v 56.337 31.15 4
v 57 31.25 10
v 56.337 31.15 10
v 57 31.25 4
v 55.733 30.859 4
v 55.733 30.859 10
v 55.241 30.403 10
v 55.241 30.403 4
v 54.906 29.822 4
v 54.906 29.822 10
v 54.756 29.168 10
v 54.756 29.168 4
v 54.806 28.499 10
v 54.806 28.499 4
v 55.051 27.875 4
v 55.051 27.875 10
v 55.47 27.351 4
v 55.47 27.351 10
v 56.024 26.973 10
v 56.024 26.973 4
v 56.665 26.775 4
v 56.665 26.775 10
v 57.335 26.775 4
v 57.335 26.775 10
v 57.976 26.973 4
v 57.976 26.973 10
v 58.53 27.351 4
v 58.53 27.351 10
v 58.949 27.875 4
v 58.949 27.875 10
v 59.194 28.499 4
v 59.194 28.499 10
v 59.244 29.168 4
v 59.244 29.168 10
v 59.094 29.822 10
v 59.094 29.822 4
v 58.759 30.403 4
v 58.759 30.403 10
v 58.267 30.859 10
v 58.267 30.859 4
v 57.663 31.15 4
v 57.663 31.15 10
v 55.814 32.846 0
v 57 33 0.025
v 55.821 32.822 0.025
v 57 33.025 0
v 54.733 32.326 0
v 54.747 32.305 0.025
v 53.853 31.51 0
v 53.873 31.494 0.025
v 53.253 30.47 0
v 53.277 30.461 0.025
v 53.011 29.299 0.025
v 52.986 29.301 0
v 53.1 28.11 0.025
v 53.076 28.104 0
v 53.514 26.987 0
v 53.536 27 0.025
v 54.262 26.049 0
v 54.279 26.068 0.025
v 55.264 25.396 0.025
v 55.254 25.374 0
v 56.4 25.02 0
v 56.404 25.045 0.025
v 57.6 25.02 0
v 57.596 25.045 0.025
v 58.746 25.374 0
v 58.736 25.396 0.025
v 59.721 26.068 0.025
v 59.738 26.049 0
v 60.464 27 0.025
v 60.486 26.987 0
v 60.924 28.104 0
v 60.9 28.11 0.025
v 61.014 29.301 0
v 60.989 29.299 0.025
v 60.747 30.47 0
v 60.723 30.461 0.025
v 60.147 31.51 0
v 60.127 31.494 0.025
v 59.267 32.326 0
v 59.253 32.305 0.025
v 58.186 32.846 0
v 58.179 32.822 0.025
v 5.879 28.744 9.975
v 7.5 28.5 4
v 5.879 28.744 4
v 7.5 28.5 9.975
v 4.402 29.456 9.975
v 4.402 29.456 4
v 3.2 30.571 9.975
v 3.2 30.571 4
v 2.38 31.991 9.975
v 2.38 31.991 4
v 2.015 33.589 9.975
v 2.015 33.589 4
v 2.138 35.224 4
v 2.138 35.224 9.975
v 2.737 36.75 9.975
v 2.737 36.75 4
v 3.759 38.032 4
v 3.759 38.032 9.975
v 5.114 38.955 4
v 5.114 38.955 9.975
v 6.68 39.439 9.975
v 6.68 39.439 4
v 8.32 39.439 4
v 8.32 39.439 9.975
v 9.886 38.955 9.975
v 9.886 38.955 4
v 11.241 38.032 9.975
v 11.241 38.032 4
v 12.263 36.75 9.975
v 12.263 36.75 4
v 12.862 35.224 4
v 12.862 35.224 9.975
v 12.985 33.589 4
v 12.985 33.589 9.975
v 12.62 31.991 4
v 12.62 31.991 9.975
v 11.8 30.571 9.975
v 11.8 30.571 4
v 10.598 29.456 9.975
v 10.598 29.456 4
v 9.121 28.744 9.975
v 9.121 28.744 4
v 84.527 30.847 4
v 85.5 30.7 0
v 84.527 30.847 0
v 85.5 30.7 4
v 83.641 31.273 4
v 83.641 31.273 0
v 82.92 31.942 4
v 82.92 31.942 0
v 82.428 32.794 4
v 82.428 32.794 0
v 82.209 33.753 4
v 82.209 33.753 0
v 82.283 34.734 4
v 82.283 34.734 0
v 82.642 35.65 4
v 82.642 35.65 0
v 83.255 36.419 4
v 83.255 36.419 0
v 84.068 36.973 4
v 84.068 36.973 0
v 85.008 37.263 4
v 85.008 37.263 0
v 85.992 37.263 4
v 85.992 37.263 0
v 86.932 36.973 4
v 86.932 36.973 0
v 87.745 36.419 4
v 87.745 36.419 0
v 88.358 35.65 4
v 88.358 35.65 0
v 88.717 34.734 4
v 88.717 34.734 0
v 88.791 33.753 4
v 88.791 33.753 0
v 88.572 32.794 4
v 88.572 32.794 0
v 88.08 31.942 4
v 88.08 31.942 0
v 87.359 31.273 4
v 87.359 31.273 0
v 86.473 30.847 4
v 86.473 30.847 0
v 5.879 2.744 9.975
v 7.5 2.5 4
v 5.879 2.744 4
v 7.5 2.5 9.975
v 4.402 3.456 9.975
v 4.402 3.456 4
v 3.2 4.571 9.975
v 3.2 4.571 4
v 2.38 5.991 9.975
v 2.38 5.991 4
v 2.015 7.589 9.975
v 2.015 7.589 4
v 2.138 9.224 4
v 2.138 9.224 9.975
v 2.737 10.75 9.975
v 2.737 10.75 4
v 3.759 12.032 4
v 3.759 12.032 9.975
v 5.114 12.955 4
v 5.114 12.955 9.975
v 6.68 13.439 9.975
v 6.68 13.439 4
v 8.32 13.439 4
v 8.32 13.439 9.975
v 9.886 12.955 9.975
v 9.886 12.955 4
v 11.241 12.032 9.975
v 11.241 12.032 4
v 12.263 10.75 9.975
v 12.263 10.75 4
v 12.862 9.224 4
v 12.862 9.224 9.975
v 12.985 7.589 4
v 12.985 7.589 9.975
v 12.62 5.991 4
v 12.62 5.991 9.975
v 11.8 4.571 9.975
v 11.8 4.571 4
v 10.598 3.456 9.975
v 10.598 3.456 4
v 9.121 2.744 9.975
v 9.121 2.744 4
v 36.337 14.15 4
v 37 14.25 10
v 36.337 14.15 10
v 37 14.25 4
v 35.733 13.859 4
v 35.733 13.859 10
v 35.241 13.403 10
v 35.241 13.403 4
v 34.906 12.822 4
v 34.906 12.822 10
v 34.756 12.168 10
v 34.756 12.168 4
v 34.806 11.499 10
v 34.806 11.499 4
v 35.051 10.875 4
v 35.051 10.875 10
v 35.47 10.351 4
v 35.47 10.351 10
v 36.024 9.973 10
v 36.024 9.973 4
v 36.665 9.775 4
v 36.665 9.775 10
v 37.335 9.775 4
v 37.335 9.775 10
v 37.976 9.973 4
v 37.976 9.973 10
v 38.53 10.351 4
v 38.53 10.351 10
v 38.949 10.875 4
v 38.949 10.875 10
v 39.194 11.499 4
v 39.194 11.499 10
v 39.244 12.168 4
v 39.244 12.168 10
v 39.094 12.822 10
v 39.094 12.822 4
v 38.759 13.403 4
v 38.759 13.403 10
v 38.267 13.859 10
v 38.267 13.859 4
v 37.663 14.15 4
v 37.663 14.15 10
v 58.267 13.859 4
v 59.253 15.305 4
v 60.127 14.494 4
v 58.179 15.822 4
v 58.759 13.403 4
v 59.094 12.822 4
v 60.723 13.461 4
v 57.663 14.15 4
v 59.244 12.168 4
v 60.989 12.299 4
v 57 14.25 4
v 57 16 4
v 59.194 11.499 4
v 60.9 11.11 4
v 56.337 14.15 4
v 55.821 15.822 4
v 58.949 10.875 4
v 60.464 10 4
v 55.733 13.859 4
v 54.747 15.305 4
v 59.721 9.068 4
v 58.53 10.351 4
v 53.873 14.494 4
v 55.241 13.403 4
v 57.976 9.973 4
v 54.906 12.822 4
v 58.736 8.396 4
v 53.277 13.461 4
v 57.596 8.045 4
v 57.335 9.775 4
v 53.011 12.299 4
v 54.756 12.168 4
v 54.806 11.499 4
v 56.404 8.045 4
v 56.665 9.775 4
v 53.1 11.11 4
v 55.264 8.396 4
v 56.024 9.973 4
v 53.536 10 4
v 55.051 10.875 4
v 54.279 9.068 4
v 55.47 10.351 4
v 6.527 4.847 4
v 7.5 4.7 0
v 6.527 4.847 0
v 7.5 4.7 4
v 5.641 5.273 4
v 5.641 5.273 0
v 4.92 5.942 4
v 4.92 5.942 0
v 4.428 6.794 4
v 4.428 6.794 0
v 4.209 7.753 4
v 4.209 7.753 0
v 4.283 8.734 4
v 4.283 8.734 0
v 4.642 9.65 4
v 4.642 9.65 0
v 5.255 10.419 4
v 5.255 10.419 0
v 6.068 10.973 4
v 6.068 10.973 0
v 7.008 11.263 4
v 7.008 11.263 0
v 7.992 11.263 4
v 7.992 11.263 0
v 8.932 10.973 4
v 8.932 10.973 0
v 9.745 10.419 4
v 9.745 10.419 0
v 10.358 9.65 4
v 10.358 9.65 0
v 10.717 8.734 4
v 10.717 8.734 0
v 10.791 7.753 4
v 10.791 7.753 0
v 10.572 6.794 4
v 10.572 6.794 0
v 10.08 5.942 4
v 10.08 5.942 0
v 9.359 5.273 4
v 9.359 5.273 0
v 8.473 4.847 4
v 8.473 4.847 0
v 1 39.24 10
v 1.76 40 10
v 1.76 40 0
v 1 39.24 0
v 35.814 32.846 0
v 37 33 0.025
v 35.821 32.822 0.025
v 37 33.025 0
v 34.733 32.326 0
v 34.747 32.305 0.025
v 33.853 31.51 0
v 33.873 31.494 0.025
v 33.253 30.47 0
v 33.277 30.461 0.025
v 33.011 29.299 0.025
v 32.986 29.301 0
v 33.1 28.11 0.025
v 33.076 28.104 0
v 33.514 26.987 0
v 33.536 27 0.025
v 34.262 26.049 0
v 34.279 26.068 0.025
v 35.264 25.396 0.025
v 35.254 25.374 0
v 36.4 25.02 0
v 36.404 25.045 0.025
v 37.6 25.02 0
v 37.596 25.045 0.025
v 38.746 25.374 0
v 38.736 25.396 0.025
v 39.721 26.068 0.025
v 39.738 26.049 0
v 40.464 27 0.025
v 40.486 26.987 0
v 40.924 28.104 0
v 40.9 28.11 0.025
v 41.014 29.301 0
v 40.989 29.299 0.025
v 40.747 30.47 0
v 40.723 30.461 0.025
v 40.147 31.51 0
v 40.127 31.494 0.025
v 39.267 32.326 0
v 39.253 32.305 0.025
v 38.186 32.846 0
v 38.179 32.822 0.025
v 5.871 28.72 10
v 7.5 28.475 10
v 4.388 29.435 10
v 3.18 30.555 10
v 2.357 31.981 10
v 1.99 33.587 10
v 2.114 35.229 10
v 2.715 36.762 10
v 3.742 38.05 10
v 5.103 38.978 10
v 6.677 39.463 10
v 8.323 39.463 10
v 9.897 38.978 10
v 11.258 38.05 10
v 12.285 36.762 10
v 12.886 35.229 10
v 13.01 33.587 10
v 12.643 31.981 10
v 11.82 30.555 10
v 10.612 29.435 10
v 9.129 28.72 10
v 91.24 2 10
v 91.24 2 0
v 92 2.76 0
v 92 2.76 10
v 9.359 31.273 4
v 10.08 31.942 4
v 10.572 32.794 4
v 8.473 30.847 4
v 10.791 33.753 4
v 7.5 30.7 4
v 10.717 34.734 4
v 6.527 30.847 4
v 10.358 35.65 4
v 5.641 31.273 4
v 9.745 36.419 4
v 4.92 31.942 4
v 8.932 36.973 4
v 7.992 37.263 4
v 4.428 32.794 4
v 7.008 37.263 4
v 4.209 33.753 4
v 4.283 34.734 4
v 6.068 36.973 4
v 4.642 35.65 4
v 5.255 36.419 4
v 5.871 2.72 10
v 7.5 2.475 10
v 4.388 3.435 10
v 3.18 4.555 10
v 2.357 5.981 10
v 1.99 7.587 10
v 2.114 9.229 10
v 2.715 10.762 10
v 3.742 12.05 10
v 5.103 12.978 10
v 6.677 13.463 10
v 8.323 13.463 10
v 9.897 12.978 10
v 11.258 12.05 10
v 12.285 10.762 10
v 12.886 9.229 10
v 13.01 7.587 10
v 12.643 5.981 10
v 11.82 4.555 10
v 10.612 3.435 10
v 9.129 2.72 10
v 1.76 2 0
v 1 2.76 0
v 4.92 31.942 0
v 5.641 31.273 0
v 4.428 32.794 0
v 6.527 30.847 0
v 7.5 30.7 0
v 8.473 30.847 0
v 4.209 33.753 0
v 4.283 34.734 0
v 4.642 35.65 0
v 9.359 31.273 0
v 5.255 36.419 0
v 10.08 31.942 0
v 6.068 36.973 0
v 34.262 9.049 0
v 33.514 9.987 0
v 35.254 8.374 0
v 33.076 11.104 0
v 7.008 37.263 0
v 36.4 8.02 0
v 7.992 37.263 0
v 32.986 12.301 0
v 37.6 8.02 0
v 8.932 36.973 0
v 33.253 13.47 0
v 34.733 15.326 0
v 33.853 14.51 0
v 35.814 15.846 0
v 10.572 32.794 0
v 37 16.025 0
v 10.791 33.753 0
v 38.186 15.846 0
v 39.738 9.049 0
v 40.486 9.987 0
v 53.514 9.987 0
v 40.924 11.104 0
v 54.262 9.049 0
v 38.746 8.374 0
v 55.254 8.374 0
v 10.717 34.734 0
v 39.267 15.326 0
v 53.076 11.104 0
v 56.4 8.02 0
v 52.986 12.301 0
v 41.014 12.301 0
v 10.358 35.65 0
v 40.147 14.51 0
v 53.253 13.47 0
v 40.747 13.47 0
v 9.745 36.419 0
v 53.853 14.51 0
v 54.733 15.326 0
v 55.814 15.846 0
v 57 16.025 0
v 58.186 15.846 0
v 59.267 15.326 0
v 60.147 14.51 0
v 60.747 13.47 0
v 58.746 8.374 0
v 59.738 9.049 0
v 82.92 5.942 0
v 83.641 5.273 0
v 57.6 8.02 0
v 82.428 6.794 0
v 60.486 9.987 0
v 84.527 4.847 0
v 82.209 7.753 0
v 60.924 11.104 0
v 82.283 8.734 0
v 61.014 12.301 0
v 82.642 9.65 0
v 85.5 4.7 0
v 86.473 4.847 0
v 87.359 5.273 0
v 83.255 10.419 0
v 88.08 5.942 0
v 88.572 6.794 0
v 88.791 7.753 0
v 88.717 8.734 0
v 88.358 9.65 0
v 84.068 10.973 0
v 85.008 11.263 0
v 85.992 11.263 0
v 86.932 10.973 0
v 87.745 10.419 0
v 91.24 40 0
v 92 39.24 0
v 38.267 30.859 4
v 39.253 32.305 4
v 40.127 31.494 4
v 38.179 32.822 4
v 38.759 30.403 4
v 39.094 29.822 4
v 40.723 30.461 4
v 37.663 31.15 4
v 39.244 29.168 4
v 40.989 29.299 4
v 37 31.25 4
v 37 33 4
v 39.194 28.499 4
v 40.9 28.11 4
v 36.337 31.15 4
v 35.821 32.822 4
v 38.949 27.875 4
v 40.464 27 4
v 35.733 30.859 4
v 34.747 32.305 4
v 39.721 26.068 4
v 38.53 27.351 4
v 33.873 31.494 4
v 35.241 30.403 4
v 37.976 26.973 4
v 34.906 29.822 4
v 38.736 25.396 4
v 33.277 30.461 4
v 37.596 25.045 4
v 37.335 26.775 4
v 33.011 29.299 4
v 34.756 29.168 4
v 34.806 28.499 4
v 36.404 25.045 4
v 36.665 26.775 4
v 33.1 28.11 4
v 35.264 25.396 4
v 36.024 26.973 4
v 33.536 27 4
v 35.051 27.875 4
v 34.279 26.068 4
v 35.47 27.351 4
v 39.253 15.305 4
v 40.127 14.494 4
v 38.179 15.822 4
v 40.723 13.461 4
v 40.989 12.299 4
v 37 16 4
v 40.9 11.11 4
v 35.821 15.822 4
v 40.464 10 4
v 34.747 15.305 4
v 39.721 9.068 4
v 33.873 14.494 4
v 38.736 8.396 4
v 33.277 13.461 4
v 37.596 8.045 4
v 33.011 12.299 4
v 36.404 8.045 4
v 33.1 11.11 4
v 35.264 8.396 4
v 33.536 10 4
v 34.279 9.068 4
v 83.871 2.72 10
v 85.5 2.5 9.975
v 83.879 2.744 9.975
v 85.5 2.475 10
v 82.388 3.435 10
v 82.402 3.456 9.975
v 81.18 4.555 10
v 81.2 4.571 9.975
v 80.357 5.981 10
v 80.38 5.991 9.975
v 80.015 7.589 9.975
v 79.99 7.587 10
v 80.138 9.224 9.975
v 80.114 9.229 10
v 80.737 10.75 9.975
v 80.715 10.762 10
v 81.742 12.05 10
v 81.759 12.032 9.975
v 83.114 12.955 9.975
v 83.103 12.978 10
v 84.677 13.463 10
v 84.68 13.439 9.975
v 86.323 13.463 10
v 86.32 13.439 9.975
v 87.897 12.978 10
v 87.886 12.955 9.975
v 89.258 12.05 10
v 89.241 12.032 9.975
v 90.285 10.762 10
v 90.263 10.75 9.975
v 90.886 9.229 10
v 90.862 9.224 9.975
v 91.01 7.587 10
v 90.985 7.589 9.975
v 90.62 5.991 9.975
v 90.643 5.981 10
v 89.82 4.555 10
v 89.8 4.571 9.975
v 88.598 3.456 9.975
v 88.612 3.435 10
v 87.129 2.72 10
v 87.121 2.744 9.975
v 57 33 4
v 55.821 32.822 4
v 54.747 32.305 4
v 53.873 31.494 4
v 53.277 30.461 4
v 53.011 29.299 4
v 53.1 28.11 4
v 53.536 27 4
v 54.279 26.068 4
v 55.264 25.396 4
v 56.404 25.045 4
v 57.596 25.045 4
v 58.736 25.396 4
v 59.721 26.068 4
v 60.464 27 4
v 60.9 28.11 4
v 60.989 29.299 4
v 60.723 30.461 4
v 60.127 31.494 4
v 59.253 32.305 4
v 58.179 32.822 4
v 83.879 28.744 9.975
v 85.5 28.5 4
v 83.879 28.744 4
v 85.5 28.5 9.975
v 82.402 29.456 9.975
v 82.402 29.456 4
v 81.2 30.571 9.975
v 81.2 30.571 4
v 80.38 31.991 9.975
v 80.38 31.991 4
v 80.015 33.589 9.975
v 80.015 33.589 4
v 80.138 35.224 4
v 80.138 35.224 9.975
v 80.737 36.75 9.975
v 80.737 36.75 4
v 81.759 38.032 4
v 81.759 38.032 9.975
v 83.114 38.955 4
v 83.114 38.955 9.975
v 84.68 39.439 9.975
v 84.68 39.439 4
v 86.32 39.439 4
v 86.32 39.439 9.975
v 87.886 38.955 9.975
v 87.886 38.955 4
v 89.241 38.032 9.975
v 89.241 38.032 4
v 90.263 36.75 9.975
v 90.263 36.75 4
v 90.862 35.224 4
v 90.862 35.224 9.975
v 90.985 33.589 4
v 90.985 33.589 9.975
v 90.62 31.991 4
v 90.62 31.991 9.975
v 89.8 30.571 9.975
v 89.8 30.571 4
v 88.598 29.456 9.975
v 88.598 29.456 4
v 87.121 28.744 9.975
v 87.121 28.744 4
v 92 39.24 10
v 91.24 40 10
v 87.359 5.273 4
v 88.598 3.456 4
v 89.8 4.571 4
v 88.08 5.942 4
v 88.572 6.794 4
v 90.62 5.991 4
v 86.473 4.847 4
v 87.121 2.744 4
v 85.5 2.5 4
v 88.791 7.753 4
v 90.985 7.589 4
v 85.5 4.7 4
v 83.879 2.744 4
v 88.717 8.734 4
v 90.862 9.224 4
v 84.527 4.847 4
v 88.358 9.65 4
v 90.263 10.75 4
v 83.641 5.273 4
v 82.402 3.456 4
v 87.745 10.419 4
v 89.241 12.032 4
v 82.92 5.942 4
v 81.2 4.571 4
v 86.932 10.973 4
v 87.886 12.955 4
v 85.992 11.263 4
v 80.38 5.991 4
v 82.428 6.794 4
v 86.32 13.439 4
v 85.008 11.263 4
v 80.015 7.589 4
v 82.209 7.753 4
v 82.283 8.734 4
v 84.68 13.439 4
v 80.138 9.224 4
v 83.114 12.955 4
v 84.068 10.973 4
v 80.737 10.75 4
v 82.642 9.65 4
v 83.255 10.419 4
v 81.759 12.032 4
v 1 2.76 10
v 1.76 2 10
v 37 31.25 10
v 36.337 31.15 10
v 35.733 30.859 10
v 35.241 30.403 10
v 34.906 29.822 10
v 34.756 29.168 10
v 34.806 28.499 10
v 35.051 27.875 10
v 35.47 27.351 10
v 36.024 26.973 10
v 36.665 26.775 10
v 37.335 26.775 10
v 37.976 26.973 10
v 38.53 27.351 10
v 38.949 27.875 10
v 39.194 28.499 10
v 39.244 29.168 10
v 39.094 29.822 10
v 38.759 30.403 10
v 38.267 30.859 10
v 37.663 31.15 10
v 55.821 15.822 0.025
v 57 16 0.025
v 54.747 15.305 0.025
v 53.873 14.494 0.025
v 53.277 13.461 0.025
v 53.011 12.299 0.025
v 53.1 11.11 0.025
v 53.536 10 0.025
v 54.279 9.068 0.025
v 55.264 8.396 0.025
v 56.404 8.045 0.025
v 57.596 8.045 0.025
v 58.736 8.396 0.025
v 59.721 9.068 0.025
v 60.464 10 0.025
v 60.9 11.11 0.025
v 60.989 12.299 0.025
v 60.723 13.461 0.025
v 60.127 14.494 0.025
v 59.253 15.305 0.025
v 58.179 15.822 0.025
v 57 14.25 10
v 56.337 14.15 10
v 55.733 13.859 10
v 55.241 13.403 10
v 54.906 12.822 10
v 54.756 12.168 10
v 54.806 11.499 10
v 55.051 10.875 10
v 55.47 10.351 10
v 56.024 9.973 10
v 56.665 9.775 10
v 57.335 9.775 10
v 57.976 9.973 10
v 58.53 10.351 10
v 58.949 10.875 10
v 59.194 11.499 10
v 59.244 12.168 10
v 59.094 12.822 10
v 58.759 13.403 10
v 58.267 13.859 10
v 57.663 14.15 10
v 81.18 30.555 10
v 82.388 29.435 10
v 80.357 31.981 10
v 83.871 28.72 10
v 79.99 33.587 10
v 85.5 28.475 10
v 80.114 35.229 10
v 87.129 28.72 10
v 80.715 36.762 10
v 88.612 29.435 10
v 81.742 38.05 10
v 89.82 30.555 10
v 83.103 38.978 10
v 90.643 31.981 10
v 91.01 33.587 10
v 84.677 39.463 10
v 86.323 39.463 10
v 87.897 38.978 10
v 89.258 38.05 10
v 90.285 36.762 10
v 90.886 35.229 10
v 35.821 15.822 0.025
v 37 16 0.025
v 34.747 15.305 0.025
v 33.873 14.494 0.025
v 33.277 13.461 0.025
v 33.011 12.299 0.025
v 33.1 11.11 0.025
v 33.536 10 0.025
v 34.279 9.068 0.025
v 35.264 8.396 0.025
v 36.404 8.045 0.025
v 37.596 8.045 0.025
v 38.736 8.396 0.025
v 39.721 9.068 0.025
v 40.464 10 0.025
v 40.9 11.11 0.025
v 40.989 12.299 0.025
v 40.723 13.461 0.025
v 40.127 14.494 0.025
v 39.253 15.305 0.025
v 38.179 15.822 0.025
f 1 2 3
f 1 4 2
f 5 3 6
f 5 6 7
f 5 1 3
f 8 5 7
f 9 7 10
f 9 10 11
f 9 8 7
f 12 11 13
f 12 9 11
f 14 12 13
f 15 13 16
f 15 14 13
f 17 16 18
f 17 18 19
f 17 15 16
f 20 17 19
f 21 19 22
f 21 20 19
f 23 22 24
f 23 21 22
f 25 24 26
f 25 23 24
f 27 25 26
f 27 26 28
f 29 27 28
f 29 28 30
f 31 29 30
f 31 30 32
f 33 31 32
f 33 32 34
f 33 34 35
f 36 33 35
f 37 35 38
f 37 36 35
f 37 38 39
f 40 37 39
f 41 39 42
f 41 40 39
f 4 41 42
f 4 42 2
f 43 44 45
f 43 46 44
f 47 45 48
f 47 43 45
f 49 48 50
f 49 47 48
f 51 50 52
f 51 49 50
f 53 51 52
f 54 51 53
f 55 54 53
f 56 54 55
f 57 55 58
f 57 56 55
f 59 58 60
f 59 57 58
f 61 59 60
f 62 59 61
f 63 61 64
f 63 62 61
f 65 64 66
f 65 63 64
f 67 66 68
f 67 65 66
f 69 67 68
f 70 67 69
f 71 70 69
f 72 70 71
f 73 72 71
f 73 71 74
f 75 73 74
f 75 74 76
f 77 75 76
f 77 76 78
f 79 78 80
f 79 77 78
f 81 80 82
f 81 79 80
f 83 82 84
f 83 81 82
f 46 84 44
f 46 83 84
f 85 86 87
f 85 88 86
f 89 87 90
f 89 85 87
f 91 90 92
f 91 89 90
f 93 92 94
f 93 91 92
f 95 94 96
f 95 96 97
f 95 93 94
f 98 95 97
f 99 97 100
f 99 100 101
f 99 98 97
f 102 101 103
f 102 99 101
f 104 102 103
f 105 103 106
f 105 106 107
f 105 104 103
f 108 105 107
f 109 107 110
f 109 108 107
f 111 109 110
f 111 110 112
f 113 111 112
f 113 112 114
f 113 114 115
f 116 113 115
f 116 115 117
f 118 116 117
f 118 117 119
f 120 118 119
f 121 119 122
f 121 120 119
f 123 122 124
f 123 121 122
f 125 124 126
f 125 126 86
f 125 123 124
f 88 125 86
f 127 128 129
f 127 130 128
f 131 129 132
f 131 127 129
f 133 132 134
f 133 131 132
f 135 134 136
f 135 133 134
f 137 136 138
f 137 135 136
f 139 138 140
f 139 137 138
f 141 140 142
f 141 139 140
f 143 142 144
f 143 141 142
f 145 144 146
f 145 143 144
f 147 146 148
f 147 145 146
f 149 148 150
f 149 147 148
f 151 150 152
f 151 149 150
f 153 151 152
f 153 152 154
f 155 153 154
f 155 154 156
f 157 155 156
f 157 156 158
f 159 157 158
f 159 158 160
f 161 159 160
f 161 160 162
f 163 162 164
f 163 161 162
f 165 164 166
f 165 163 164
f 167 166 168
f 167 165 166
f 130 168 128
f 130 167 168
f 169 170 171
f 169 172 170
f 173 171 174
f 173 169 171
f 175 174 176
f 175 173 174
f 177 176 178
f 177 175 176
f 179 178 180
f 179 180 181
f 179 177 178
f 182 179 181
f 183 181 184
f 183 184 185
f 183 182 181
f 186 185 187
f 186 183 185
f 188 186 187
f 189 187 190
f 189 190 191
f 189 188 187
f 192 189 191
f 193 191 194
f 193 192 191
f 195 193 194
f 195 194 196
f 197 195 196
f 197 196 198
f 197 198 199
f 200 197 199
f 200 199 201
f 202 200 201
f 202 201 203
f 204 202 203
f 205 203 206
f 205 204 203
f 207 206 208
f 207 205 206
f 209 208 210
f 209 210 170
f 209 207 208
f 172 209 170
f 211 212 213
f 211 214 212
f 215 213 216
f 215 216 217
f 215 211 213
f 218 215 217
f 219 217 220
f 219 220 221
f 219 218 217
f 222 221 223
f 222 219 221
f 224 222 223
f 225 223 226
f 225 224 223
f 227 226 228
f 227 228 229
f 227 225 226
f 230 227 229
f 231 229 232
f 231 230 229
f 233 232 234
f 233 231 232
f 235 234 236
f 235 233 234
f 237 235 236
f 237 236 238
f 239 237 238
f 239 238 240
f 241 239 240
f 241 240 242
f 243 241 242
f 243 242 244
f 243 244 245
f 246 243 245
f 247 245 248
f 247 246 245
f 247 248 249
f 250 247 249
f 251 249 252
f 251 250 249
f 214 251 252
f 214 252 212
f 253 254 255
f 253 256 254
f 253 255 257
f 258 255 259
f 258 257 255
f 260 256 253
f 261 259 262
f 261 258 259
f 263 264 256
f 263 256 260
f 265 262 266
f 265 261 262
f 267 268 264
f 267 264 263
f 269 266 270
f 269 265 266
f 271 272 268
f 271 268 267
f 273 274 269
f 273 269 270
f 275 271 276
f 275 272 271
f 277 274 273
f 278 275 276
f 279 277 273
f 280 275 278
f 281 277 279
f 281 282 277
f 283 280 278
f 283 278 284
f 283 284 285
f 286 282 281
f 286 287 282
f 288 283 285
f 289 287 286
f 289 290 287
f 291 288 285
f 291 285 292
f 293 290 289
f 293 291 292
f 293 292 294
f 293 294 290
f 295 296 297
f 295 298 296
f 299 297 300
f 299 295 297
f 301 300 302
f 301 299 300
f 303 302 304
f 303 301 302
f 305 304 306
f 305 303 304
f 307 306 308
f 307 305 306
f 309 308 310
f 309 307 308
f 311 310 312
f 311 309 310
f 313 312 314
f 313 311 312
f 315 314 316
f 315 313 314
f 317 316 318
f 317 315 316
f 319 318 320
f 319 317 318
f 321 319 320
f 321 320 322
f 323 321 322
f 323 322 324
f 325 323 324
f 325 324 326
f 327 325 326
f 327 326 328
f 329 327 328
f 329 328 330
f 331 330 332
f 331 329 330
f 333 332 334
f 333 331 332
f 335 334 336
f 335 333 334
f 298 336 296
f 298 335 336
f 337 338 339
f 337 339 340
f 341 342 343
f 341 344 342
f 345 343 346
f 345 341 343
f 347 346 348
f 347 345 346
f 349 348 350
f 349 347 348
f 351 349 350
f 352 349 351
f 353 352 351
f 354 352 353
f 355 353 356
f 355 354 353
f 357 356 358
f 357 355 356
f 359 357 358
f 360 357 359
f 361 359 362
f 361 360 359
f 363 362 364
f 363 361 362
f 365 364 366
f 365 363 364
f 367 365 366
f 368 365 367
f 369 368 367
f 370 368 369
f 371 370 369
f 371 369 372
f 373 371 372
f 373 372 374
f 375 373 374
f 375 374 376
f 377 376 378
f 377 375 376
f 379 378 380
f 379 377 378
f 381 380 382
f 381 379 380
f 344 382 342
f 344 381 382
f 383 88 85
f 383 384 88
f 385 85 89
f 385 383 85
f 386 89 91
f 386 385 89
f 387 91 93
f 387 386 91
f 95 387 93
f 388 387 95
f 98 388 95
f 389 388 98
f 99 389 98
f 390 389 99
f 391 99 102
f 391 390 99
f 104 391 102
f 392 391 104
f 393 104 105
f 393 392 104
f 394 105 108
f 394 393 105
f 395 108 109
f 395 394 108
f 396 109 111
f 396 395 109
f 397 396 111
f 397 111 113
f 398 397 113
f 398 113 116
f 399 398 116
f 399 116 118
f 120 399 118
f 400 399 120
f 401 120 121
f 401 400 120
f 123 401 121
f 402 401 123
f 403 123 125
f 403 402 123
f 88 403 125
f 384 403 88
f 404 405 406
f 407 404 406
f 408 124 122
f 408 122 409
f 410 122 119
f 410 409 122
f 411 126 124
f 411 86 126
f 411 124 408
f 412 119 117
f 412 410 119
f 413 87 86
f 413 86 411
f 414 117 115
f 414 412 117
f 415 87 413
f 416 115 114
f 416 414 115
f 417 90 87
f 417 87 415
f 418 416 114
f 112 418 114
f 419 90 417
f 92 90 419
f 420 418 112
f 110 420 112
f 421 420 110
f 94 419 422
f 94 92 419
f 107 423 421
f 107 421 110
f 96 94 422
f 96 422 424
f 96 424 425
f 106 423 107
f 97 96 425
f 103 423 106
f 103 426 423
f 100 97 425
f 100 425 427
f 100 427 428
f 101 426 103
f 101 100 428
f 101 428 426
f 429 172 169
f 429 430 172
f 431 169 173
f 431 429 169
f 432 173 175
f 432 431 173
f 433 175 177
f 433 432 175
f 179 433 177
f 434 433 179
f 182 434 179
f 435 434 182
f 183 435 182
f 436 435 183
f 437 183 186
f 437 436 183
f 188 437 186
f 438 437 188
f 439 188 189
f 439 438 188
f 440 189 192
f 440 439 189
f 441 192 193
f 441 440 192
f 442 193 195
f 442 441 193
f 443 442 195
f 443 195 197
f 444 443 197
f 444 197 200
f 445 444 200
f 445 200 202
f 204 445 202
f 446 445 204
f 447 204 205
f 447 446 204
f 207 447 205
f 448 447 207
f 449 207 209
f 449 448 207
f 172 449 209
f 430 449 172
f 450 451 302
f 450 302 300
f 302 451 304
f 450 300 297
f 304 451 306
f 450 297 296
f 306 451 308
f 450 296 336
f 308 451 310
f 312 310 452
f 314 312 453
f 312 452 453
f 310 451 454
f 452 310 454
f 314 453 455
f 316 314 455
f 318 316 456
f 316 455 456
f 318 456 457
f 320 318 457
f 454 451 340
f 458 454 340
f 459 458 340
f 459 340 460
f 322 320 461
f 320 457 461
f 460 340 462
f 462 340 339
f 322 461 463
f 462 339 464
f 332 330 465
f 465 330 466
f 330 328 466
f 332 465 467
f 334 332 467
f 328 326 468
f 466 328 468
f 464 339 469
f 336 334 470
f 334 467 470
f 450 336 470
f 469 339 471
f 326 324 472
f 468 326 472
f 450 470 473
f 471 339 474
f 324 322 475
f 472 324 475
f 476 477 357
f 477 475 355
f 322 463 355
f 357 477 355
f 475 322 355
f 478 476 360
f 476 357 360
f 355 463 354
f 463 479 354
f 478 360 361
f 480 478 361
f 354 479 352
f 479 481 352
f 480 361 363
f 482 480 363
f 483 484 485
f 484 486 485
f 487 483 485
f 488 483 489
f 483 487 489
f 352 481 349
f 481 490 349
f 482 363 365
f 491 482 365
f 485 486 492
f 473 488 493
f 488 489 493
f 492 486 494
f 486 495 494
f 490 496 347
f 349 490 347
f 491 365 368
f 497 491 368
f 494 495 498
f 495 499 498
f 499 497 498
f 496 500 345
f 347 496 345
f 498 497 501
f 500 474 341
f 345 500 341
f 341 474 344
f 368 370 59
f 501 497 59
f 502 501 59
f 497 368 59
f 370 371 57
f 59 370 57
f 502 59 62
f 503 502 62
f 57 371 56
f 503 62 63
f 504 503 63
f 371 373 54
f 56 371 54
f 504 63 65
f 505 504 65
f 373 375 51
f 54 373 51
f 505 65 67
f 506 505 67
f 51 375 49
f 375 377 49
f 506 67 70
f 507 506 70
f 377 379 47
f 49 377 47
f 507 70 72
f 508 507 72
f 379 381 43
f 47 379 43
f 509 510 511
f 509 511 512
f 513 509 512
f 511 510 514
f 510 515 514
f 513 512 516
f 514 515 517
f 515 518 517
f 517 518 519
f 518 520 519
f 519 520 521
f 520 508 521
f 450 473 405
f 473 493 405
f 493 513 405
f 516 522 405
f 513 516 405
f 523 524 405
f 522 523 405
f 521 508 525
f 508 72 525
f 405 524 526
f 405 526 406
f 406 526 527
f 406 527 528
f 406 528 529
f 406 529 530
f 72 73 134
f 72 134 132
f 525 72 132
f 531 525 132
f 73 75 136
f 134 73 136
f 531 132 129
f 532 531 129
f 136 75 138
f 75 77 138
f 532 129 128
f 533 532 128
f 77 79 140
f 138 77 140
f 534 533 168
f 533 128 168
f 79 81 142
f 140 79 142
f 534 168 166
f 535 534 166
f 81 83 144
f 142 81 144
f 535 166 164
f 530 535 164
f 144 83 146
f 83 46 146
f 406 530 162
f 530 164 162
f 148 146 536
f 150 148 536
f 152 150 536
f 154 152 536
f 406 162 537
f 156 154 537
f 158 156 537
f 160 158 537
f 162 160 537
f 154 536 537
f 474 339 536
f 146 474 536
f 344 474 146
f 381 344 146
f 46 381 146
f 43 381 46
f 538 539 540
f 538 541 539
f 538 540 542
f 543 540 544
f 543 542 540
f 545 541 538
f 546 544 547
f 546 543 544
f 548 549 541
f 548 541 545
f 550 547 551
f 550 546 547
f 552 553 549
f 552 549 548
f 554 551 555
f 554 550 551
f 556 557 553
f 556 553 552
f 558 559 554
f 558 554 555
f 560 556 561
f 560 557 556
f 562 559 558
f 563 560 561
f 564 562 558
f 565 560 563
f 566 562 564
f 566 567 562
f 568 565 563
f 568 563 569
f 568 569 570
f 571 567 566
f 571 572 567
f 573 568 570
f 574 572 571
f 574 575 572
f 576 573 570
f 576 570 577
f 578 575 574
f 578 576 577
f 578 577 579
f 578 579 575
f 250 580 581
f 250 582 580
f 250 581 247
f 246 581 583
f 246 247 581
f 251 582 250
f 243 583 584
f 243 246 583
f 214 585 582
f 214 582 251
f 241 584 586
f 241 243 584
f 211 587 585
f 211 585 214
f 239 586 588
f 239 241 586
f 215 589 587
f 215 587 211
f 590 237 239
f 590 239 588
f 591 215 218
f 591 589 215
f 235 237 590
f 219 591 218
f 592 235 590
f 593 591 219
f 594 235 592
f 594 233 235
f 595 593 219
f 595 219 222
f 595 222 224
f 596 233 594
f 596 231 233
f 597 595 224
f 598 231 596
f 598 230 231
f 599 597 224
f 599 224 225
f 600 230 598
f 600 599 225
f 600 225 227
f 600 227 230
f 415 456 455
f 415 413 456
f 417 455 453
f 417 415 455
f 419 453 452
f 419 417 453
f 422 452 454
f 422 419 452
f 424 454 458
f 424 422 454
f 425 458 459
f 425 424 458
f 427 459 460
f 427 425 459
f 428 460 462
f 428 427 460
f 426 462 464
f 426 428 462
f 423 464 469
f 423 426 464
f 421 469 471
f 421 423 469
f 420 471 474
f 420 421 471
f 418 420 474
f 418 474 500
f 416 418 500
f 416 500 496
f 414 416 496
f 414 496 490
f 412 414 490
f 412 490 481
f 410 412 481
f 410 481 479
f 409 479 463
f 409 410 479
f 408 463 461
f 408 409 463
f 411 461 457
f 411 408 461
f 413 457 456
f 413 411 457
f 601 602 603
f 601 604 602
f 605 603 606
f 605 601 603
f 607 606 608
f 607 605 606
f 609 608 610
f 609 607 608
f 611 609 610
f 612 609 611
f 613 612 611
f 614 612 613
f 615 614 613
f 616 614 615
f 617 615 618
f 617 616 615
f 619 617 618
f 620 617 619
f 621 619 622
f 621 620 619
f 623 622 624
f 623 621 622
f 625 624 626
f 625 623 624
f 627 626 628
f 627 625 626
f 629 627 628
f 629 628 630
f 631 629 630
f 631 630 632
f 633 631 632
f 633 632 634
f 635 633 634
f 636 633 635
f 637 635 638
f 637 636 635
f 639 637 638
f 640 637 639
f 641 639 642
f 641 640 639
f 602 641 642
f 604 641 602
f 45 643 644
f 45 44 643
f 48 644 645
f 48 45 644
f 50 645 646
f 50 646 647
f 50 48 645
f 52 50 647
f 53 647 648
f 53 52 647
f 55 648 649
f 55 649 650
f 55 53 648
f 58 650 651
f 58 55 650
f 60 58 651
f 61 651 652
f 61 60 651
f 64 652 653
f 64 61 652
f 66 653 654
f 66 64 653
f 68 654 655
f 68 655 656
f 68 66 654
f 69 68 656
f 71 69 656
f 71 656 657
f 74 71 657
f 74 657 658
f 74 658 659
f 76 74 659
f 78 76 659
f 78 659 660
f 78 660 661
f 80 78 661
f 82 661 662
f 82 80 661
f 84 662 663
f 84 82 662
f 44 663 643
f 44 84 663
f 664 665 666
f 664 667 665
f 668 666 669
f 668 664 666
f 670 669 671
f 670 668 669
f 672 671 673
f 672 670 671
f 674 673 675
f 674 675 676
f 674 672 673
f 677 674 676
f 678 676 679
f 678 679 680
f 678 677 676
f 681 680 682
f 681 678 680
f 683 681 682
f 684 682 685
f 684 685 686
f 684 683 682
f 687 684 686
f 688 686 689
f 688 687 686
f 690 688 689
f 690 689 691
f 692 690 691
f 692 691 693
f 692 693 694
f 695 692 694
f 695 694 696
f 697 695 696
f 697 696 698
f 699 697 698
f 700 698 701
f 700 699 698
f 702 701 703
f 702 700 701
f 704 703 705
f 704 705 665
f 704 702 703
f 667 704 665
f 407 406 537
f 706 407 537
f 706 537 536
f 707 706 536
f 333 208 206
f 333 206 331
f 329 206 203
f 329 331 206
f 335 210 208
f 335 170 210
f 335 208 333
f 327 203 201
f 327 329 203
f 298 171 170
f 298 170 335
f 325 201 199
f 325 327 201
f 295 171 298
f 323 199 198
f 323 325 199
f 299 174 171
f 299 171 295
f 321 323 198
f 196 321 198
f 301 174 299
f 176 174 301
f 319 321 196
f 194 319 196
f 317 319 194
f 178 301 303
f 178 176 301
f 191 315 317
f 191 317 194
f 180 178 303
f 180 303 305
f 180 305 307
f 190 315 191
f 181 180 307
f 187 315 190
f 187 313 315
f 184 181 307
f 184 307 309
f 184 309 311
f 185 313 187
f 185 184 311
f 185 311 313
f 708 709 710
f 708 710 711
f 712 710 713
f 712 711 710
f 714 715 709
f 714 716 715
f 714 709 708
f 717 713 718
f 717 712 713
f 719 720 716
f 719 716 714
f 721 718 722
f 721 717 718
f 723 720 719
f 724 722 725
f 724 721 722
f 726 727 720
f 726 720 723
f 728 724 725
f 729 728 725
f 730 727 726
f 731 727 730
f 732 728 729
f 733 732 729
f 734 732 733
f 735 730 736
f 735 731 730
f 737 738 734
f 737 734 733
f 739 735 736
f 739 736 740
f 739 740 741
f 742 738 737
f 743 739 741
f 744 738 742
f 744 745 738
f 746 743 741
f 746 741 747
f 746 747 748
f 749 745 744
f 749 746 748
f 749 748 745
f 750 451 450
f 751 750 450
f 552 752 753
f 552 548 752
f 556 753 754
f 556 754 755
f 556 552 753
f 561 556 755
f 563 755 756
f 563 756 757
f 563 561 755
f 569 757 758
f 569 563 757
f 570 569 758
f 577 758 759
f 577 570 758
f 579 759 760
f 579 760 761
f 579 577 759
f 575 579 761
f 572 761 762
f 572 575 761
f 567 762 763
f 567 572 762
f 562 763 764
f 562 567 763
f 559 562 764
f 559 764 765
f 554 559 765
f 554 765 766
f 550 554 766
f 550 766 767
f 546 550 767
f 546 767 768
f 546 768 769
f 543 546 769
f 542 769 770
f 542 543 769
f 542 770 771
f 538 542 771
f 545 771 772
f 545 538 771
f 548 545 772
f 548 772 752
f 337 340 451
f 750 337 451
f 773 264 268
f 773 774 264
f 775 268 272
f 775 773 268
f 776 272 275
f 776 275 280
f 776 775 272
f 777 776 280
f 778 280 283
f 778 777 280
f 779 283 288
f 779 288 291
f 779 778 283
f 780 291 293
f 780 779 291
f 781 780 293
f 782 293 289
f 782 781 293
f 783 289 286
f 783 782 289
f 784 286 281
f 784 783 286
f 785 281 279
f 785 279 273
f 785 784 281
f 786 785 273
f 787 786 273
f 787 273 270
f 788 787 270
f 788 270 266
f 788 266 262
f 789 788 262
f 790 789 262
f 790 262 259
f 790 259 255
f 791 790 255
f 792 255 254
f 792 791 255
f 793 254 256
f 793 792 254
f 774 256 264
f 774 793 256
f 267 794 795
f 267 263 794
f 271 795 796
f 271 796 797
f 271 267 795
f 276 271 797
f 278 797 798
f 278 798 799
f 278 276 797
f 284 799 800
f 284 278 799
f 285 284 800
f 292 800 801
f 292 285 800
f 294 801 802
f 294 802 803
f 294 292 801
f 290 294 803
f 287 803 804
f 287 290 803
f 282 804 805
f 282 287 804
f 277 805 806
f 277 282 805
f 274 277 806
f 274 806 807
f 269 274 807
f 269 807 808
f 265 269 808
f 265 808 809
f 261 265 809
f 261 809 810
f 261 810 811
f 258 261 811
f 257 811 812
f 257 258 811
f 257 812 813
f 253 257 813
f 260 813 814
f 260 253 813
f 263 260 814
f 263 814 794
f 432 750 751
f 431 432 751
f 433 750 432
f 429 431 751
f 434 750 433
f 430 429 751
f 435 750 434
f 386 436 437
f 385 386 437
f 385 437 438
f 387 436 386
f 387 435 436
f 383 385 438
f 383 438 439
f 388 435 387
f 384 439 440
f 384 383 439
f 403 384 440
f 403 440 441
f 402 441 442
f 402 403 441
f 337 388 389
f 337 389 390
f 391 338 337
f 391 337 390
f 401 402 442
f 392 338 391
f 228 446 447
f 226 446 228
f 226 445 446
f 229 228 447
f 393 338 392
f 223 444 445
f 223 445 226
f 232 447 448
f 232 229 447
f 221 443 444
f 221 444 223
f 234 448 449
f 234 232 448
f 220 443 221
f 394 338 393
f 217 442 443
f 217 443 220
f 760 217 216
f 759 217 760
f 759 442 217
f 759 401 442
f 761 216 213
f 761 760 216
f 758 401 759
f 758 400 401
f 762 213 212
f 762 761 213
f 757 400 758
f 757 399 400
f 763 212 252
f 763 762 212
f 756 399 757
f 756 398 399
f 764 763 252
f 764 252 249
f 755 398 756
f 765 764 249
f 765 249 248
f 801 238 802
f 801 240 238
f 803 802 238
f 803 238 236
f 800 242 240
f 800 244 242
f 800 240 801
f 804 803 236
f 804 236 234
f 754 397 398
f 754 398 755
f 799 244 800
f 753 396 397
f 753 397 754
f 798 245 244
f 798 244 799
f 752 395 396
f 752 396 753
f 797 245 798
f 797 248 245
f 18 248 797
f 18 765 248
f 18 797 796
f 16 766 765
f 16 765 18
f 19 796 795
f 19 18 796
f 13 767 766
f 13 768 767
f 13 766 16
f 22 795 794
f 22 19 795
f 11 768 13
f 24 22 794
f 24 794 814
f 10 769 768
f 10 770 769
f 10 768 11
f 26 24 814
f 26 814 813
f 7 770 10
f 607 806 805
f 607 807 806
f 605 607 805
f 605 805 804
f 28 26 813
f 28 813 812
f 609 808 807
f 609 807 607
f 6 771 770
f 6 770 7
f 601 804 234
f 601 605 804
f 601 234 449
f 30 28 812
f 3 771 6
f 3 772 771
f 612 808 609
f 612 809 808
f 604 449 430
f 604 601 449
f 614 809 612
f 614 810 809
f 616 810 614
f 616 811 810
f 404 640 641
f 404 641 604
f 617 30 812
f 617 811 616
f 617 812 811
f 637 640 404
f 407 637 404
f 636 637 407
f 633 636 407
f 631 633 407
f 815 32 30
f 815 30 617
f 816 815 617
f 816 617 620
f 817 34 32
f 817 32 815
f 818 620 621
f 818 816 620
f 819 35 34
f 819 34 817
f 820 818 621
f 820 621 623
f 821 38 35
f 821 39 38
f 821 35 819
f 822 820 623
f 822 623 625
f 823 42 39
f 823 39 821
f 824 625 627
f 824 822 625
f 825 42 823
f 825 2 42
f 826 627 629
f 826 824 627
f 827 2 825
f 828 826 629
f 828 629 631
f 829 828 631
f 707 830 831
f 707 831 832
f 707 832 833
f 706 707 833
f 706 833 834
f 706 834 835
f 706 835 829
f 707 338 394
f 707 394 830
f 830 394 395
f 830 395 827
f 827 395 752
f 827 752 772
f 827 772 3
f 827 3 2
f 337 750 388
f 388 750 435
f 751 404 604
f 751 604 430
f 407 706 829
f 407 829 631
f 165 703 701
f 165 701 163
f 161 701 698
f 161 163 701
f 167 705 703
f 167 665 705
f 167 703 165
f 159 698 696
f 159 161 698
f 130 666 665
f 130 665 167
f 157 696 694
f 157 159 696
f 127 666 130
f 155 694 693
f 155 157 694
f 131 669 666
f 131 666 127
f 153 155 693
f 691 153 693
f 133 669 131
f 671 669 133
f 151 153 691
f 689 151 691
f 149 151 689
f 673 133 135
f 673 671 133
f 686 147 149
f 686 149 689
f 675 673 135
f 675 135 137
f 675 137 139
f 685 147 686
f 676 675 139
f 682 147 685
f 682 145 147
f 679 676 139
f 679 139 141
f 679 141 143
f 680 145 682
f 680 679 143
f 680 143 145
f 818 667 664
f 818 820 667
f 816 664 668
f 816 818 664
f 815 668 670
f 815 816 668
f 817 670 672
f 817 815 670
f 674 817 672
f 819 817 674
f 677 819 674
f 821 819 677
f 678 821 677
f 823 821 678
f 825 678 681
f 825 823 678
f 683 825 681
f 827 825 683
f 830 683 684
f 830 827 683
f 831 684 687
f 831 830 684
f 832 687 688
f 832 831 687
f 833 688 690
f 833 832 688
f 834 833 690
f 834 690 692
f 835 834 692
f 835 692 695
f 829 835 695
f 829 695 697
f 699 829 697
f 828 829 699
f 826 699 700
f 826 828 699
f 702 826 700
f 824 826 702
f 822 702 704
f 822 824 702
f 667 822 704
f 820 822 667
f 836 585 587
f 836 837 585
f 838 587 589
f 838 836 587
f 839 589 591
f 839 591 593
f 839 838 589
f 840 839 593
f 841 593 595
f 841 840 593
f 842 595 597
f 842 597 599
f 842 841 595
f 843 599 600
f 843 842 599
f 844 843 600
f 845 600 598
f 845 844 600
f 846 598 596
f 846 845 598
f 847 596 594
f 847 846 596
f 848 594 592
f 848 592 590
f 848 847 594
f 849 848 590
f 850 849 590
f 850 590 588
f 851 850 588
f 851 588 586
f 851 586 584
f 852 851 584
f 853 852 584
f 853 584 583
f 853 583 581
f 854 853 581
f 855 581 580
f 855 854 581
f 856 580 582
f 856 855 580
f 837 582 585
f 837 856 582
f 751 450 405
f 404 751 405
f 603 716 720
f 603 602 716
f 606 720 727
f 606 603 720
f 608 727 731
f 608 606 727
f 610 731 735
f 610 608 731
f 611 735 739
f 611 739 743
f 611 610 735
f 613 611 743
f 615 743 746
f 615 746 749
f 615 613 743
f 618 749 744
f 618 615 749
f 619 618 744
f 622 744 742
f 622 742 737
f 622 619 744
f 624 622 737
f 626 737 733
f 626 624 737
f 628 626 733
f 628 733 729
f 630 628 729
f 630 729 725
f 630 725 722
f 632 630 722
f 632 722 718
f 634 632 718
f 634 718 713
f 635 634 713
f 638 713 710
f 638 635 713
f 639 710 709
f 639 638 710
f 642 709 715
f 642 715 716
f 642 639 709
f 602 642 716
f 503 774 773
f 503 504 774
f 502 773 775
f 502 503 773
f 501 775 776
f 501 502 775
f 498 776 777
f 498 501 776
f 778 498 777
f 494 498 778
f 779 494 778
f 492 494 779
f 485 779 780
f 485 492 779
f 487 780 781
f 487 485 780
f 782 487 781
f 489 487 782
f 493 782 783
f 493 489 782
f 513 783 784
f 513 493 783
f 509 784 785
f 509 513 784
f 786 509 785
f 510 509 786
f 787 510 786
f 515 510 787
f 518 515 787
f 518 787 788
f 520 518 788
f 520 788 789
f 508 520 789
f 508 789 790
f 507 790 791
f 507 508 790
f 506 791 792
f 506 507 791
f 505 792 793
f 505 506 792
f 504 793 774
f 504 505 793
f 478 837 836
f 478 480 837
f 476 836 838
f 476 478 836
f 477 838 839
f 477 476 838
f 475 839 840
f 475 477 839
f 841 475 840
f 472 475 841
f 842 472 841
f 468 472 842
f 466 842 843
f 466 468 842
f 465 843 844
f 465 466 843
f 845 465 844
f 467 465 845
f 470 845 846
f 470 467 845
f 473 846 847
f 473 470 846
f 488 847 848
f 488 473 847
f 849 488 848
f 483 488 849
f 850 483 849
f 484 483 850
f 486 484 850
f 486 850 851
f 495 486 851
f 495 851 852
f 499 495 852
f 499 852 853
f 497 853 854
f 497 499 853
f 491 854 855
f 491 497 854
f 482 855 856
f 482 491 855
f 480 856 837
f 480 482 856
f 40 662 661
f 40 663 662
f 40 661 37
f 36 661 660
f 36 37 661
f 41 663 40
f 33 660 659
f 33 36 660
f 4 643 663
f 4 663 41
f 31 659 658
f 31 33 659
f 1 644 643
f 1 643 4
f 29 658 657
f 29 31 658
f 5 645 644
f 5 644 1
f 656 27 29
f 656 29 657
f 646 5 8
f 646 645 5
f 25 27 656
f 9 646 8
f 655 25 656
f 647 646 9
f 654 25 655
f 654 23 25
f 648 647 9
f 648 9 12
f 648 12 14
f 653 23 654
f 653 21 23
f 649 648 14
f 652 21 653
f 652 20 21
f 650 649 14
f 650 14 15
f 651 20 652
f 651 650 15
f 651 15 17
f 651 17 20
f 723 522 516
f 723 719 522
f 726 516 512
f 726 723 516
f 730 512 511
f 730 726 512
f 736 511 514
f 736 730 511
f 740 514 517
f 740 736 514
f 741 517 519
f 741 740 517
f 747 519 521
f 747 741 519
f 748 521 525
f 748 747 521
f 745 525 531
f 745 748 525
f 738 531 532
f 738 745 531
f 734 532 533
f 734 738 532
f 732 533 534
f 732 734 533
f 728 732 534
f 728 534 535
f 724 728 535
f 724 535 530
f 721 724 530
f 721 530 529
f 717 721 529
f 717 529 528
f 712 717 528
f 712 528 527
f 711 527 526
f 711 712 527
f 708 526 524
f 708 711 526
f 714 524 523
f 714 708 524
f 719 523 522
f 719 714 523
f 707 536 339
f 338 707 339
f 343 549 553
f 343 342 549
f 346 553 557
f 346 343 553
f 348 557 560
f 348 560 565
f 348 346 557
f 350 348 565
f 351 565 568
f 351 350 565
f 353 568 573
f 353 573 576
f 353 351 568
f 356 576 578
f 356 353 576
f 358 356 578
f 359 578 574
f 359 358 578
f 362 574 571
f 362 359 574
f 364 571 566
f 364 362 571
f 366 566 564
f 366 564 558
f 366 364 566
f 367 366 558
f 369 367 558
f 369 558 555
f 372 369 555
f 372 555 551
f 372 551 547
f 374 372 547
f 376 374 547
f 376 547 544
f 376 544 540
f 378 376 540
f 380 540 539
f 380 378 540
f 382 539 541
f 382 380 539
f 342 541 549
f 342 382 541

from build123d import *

# Parameters (mm, degrees)
BOSS_EXTRUDE1_DEPTH  = 10
LPATTERN2_COUNT      = 2
LPATTERN2_PITCH      = 78
LPATTERN2_COUNT_DIR2 = 2
LPATTERN2_PITCH_DIR2 = 26
LPATTERN3_COUNT      = 2
LPATTERN3_PITCH      = 20
LPATTERN3_COUNT_DIR2 = 2
LPATTERN3_PITCH_DIR2 = 17


with BuildPart() as part:
    # Sketch1 → Boss-Extrude1 (new body)
    with BuildSketch(Plane.XY):
        Polygon((92.000001103, 39.239999717), (91.240001103, 39.999999717), (1.760001103, 39.999999717), (1.000001103, 39.239999717), (1.000001103, 2.759999717), (1.760001103, 1.999999717), (91.240001103, 1.999999717), (92.000001103, 2.759999717), align=None)
    extrude(amount=BOSS_EXTRUDE1_DEPTH)

    # Sketch4 → CBORE for M6 SHCS1 (revolve, cut)
    with BuildSketch(Plane(origin=(7.500001103, 33.999999717, 10), x_dir=(0, -1, 0), z_dir=(1, 0, 0))):
        Polygon((0, 0), (0, 10), (3.3, 10), (3.3, 6), (5.5, 6), (5.5, 0.025), (5.525, 0), align=None)
    cbore_for_m6_shcs1 = revolve(axis=Axis((7.500001103, 33.999999717, 16.35), (0, 0, -1)), mode=Mode.SUBTRACT)

    # LPattern2: CBORE for M6 SHCS1 2 × 2
    with Locations(*[(i * LPATTERN2_PITCH, -j * LPATTERN2_PITCH_DIR2, 0) for i in range(LPATTERN2_COUNT) for j in range(LPATTERN2_COUNT_DIR2) if (i, j) != (0, 0)]):
        add(cbore_for_m6_shcs1, mode=Mode.SUBTRACT)

    # Sketch6 → CBORE for M4 SHCS1 (revolve, cut)
    with BuildSketch(Plane(origin=(57.000001103, 11.999999717, 0), x_dir=(0, 1, 0), z_dir=(1, 0, 0))):
        Polygon((0, 0), (0, 10), (2.25, 10), (2.25, 4), (4, 4), (4, 0.025), (4.025, 0), align=None)
    cbore_for_m4_shcs1 = revolve(axis=Axis((57.000001103, 11.999999717, -6.35), (0, 0, 1)), mode=Mode.SUBTRACT)

    # LPattern3: CBORE for M4 SHCS1 2 × 2
    with Locations(*[(-i * LPATTERN3_PITCH, j * LPATTERN3_PITCH_DIR2, 0) for i in range(LPATTERN3_COUNT) for j in range(LPATTERN3_COUNT_DIR2) if (i, j) != (0, 0)]):
        add(cbore_for_m4_shcs1, mode=Mode.SUBTRACT)


solid = part.part
